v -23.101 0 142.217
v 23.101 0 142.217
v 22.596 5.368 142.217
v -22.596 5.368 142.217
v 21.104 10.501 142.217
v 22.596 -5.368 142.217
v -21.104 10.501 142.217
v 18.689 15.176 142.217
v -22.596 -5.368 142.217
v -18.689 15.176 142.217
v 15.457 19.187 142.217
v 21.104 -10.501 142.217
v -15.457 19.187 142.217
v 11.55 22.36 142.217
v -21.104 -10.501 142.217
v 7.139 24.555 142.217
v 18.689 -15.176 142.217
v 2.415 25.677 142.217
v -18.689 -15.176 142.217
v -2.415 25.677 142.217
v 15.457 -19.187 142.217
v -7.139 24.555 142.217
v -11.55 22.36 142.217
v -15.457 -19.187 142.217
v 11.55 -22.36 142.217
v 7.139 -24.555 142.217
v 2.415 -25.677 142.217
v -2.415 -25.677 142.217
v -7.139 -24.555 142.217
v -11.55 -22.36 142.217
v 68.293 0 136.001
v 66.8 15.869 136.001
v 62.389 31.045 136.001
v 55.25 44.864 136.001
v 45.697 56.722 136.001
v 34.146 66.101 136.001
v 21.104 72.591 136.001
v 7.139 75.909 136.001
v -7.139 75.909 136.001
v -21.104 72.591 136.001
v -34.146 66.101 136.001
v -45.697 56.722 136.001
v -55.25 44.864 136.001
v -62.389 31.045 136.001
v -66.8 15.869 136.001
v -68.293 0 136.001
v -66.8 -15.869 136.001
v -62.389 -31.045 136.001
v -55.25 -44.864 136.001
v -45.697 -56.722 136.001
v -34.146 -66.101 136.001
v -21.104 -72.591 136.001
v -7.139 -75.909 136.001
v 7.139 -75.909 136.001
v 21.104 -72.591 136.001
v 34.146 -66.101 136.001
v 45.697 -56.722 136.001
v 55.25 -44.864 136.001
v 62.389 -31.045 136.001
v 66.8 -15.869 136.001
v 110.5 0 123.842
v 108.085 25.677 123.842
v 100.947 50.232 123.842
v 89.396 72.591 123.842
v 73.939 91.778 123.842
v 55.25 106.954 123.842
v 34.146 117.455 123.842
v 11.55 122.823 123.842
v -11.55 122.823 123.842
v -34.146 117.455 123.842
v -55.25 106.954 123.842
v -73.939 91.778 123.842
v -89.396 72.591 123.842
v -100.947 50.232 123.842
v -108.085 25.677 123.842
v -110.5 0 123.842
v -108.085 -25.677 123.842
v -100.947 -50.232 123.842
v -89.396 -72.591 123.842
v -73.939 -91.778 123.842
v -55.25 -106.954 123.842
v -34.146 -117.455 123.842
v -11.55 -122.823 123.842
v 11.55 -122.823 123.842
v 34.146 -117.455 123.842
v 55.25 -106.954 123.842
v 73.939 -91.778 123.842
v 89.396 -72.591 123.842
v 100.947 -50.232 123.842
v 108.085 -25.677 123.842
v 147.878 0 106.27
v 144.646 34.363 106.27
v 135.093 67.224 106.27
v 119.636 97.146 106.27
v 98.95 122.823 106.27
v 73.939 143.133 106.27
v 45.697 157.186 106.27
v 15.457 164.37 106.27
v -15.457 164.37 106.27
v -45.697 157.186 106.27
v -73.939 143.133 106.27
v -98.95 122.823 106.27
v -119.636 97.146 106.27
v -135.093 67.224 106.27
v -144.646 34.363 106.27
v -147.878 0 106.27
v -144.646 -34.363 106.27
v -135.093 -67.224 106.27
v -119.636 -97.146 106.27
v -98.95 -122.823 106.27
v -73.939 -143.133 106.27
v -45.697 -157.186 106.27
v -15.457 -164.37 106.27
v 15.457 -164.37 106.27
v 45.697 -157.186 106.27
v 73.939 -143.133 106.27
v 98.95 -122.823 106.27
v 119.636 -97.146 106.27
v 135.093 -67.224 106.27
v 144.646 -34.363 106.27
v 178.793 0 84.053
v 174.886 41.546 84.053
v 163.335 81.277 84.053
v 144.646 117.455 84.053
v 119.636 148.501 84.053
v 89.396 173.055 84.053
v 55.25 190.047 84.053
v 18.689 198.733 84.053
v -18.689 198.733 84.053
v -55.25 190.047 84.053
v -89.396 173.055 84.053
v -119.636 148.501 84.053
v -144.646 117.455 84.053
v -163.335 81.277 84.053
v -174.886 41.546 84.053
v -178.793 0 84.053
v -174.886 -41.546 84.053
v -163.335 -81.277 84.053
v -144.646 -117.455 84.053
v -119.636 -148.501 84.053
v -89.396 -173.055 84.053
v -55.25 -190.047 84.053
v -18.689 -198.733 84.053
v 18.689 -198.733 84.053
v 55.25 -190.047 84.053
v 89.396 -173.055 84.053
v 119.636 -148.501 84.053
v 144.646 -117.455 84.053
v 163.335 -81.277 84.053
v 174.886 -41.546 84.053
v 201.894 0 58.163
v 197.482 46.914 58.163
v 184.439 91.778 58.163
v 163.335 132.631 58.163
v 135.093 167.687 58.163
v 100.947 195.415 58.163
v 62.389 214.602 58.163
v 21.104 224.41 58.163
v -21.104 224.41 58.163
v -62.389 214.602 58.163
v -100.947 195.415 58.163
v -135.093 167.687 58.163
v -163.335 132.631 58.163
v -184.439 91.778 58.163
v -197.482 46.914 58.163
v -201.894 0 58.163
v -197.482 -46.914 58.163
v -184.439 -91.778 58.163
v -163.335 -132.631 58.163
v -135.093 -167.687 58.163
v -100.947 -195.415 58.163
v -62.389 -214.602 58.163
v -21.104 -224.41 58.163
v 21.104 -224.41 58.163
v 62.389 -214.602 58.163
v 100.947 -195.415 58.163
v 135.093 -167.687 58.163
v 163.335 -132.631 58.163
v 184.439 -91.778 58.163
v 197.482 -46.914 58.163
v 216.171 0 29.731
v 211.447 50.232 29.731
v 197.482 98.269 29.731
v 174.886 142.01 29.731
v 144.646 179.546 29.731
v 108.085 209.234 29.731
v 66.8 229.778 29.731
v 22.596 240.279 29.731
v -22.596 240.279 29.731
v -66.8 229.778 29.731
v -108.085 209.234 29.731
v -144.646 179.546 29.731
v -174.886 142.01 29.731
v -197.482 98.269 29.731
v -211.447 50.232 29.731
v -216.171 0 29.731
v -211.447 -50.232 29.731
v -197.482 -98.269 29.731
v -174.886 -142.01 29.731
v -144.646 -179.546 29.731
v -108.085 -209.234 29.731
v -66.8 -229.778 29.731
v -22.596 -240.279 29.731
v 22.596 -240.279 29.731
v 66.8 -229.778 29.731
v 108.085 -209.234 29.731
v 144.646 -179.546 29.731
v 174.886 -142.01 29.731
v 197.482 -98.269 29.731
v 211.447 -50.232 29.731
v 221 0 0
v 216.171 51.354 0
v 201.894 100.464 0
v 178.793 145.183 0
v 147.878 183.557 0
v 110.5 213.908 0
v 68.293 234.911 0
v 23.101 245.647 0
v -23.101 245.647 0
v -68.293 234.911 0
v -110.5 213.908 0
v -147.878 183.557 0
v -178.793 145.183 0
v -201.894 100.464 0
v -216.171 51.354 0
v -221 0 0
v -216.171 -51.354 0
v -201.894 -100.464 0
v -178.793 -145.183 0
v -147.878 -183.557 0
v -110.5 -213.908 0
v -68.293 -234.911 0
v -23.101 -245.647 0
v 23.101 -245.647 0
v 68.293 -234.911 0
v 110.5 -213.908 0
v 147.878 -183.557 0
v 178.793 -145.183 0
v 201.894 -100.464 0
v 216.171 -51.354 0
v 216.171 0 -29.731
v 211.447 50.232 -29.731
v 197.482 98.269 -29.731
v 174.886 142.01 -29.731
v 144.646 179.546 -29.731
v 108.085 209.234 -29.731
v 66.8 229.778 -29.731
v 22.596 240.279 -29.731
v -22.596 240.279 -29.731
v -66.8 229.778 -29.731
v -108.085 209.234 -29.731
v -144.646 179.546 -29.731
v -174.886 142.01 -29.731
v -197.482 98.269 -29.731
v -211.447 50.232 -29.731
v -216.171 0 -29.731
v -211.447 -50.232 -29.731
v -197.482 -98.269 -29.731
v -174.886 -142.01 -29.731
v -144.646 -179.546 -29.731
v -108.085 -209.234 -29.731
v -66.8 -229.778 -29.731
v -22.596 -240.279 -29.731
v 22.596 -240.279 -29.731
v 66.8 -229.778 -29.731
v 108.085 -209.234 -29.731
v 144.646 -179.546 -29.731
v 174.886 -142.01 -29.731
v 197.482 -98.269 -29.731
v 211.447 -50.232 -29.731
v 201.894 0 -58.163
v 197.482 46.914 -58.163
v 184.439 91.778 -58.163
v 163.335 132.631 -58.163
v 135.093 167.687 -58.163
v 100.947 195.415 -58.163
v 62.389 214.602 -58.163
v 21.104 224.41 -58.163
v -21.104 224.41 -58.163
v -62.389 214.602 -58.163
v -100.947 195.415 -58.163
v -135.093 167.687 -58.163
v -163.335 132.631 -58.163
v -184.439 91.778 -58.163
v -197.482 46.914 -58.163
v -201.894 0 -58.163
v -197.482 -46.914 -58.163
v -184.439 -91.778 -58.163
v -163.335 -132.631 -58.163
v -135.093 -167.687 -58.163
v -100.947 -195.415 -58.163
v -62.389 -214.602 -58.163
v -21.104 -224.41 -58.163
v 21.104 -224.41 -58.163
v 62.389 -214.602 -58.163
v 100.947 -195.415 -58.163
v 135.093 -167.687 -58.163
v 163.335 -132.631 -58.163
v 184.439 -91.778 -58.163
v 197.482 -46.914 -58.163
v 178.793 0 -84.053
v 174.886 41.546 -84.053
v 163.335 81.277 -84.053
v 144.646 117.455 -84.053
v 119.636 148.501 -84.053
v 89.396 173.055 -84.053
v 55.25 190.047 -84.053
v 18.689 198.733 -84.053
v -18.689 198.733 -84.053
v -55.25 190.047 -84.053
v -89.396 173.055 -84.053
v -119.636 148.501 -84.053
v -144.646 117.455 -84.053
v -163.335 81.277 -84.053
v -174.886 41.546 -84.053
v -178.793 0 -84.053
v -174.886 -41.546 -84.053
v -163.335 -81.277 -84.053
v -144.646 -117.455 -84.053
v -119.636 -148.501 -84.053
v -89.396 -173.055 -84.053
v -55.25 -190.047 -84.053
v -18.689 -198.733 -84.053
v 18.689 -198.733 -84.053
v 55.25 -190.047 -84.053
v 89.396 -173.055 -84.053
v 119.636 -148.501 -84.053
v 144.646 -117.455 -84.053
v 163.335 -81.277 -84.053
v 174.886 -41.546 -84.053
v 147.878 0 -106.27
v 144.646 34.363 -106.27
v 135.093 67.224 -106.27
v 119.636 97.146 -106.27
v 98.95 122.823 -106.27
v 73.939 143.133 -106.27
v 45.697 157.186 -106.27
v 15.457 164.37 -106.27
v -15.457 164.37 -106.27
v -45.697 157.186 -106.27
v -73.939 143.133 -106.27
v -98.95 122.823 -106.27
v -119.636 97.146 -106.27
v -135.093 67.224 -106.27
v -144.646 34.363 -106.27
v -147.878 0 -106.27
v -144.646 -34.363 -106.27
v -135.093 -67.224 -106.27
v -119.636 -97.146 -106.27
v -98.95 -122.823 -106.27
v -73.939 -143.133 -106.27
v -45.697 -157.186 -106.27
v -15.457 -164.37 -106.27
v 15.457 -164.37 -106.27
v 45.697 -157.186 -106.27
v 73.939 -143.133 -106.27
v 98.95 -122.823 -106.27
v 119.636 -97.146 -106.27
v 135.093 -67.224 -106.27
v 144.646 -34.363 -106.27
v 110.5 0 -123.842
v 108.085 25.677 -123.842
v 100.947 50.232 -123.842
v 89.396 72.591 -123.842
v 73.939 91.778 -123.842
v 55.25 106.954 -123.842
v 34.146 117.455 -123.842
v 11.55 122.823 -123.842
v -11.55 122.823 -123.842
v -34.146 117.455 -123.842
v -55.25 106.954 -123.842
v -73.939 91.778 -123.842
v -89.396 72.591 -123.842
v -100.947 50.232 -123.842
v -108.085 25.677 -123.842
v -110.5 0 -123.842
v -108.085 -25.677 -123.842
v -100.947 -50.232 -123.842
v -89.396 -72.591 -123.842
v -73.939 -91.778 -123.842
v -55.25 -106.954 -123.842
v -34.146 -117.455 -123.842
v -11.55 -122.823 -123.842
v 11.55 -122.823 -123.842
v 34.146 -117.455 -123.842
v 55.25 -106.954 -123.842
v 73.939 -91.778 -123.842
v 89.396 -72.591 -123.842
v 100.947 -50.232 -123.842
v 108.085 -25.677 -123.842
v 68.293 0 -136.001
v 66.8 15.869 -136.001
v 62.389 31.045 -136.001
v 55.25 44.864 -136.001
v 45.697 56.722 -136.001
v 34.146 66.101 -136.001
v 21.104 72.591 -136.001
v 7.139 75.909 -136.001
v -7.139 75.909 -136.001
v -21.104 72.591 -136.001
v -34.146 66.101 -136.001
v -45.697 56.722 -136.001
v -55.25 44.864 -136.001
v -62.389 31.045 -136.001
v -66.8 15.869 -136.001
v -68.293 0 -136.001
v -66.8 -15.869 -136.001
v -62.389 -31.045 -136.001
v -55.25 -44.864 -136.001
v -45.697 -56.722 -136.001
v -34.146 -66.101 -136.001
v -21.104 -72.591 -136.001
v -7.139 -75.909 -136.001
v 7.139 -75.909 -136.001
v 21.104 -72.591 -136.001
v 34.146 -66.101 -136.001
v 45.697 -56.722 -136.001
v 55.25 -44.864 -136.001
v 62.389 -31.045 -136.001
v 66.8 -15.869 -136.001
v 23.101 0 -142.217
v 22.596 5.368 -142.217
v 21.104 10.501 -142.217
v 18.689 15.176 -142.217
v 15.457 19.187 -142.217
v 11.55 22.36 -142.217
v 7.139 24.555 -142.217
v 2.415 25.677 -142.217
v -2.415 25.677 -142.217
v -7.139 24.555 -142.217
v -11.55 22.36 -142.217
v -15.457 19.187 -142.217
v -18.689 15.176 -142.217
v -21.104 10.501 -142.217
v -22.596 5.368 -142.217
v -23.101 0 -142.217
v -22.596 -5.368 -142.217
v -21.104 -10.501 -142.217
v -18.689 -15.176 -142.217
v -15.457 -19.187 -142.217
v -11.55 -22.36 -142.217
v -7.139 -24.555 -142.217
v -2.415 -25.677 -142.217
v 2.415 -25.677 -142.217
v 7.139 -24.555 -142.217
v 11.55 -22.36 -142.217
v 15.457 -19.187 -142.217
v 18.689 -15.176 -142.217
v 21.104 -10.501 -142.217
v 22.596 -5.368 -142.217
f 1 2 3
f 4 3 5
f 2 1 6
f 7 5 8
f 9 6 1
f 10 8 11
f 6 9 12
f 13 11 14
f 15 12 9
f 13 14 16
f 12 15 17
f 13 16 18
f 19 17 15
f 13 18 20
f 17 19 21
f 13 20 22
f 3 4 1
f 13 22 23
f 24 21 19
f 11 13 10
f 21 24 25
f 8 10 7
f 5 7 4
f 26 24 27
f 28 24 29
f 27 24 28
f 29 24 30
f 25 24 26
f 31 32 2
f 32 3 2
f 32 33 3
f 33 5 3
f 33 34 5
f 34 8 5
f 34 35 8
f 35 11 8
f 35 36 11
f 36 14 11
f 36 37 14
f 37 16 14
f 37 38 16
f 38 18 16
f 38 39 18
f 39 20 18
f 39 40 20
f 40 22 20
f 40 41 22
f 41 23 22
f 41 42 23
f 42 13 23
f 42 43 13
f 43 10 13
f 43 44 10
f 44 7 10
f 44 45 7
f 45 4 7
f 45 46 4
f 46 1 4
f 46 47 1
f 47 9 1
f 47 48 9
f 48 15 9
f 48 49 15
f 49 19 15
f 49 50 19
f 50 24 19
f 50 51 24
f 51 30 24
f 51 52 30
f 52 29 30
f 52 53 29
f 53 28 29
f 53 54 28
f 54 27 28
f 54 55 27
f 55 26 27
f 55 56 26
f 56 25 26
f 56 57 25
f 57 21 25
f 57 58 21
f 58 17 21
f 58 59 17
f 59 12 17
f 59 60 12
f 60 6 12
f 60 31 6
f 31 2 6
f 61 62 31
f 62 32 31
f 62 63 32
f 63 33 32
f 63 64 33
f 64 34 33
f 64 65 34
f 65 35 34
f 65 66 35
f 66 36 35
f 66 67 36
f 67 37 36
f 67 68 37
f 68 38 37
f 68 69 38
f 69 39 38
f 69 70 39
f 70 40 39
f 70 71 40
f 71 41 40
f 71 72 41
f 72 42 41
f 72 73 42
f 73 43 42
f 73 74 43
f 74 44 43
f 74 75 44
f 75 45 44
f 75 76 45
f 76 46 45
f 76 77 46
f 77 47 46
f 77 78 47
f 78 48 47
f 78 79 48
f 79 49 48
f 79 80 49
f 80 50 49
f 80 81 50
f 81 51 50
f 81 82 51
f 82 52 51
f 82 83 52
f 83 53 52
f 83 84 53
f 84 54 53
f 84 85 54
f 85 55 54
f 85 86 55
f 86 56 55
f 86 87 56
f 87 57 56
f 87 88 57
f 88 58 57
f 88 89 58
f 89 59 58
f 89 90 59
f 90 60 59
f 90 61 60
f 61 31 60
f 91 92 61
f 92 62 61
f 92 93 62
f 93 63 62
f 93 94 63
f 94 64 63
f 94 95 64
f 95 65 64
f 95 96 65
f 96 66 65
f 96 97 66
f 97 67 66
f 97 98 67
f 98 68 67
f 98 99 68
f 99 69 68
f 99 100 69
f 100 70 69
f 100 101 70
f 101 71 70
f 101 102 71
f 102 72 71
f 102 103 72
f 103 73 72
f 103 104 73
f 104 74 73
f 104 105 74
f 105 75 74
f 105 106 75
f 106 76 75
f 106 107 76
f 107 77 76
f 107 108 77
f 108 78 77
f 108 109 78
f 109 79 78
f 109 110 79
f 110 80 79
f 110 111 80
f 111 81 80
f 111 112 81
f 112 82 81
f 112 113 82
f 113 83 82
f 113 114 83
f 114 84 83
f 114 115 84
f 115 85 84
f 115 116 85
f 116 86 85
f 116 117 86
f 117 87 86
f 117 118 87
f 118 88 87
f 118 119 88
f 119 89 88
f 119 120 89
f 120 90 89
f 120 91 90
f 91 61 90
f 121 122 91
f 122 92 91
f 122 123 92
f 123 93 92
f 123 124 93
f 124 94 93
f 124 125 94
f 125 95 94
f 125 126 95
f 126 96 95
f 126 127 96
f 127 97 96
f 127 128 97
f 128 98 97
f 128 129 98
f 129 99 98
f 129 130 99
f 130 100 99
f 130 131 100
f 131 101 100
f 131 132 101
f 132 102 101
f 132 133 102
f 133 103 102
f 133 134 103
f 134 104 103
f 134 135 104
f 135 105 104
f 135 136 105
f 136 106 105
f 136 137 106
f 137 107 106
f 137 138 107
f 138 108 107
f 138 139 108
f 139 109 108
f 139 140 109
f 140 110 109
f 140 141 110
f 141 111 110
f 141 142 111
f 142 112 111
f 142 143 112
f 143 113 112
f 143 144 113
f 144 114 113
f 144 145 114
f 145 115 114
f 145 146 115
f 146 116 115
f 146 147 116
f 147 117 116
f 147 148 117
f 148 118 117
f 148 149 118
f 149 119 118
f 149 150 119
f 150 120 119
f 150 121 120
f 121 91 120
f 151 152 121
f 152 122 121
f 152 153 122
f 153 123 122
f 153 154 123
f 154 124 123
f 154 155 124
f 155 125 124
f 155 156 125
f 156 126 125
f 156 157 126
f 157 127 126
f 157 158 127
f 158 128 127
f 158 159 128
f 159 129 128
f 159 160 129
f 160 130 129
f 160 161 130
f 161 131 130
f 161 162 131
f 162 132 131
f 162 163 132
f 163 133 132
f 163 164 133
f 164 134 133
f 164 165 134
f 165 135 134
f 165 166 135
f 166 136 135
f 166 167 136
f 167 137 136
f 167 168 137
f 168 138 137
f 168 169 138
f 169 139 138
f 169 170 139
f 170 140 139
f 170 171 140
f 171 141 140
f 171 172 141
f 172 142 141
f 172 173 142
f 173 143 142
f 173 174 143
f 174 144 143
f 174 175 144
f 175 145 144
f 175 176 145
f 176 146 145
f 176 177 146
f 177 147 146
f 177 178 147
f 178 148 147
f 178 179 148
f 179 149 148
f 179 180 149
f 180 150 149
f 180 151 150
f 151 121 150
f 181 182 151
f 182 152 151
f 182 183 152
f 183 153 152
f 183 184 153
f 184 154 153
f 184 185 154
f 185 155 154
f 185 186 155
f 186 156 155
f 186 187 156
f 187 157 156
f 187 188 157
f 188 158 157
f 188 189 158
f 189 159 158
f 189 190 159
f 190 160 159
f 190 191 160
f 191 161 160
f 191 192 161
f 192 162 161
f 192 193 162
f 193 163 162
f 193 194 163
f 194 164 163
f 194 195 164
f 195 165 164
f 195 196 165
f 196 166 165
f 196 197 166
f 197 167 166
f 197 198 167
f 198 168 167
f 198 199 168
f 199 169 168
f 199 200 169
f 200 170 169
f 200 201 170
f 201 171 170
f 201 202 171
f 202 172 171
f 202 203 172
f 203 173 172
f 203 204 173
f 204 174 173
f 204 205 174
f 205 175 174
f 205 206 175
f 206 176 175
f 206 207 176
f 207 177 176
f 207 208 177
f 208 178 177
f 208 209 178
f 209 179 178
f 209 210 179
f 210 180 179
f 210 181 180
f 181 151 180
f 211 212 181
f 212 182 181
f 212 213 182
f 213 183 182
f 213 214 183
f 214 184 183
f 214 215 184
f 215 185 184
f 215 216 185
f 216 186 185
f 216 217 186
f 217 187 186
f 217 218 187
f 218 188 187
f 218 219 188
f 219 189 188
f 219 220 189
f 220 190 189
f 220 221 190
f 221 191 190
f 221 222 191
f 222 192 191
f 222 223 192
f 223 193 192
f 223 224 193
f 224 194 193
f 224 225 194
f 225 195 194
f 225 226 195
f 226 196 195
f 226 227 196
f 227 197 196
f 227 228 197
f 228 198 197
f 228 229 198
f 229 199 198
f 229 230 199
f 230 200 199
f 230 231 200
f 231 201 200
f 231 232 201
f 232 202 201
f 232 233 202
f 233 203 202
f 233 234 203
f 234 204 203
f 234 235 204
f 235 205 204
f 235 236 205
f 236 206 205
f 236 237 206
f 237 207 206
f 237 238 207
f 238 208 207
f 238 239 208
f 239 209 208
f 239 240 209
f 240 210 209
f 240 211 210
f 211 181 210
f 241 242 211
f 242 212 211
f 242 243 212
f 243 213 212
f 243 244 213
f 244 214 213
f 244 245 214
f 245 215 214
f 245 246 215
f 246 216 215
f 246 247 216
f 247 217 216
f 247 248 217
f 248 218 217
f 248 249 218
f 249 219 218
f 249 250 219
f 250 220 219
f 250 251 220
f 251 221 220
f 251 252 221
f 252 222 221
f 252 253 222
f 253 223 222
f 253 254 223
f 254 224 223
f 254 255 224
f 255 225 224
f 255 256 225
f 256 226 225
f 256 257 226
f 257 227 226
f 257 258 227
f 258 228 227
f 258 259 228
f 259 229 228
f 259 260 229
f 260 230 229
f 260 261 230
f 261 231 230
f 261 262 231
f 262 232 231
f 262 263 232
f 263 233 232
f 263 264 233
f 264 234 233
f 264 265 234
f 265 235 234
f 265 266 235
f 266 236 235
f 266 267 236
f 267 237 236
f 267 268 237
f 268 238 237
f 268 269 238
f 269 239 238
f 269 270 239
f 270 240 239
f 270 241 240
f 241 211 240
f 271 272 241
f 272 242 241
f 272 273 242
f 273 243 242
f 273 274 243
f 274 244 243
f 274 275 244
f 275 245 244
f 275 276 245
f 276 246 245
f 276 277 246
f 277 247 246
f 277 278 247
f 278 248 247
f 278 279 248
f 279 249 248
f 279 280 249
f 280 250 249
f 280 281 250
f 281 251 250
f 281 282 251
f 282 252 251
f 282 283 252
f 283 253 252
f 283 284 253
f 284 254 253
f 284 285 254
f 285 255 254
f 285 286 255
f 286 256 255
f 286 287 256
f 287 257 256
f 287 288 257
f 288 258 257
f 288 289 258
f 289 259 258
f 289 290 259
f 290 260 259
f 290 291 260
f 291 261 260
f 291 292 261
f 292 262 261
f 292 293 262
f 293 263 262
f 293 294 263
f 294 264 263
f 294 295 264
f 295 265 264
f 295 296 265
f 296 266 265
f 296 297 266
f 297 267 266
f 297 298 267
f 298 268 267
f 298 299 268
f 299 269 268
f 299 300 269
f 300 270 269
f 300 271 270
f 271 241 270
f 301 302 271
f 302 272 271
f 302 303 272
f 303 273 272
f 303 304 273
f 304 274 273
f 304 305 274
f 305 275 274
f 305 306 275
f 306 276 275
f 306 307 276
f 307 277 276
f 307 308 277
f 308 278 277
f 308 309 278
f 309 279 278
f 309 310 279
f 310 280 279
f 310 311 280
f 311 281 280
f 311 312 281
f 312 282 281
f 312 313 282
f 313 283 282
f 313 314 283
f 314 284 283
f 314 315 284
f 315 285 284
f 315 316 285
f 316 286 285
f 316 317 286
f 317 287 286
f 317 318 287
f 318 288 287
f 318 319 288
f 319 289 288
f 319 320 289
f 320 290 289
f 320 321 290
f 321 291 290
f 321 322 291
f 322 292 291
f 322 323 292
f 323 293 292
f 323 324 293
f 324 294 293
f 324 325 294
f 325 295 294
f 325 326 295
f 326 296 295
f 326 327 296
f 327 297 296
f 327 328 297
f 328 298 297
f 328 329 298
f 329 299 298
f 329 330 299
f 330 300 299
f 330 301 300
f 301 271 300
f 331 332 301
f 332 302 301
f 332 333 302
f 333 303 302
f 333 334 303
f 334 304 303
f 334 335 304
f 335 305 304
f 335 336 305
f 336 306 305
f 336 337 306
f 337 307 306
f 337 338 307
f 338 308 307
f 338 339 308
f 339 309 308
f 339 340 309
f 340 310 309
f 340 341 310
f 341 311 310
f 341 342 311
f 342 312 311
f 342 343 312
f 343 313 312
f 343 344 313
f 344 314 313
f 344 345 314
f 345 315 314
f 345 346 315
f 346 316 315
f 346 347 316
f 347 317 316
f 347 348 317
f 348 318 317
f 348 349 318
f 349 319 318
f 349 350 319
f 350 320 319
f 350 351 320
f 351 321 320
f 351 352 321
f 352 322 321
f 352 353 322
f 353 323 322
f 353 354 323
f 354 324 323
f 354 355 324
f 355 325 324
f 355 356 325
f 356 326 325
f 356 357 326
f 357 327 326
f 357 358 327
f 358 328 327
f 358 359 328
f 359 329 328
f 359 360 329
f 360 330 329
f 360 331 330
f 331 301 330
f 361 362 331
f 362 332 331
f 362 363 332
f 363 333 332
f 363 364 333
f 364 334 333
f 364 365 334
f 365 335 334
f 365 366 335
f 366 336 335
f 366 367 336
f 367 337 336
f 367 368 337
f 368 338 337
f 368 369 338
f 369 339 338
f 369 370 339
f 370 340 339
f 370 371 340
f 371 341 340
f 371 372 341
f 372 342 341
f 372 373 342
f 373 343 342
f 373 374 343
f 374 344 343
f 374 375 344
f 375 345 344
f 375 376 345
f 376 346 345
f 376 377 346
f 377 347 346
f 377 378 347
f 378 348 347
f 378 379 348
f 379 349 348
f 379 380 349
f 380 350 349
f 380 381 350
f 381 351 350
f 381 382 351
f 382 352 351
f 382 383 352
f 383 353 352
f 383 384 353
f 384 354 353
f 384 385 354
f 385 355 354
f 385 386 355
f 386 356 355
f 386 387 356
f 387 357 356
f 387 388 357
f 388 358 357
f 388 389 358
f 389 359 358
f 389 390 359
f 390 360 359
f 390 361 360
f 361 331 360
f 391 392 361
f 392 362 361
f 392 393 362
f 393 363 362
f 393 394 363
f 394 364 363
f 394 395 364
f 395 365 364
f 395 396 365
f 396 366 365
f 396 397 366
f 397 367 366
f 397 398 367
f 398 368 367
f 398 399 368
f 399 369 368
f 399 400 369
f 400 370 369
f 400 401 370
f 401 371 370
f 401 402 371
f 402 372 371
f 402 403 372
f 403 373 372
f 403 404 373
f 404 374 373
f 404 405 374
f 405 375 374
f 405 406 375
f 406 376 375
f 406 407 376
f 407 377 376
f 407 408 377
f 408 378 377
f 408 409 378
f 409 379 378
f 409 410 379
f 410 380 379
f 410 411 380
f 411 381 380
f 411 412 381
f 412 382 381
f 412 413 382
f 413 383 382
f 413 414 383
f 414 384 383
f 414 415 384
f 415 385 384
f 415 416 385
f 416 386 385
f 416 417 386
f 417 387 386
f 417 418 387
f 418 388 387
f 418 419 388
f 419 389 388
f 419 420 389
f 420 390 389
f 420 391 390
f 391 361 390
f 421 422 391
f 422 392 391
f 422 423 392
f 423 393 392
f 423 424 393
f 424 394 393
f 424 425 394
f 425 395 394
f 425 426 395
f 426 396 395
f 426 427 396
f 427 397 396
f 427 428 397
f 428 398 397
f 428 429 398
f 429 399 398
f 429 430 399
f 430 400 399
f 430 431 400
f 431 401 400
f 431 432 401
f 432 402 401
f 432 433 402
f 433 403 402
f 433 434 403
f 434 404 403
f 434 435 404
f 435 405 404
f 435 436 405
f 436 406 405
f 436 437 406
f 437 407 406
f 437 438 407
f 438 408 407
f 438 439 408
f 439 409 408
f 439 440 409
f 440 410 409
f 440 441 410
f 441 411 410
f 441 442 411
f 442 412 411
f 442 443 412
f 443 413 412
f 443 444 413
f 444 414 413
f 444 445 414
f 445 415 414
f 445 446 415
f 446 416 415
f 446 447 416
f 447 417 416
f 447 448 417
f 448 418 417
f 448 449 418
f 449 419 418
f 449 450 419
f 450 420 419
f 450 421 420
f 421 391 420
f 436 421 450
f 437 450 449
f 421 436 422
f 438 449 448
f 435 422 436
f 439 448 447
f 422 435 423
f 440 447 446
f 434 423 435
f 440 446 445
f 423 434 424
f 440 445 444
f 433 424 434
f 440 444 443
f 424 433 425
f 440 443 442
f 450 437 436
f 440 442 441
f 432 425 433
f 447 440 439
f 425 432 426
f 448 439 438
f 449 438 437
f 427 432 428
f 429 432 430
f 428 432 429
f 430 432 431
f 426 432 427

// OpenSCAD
// Generated by SolidPython 1.0.1 on 2020-07-29 00:46:53


scale(v = [17, 19, 11]) {
	sphere(r = 13);
}
/***********************************************
*********      SolidPython code:      **********
************************************************
 
# import packages: SolidPython
from solid import *
from solid.utils import *
from itertools import chain, combinations, permutations


class Resize:

    def __init__(self, scad_file):
        self.scad_file = scad_file
        #self.scad_file = import_scad(scad_file)
        # cone/cylinder param:
        self.r1 = 0
        self.r2 = 0
        self.h = 0
        # rectangular prism param:
        self.w = 0
        self.l = 0
        # ellipse param:
        self.r = 0

    # import OpenScad code (file name corresponds to shape)


    # classify shape + parameters
    def assign(self, param1, param2, param3):
        if self.scad_file == 'cone.scad':
            self.r1 = param1
            self.r2 = param2
            self.h = param3
        elif self.scad_file == 'cylinder.scad':
            self.r1 = param1
            self.r2 = param2
            self.h = param3
        elif self.scad_file == 'rectangularPrism.scad':
            self.h = param1
            self.l = param2
            self.w = param3
        else:
            self.r = param1
            self.h = param2

    # resize parameters
    def iterate(self):
        x = range(3, 20, 2)
        i = 1
        if self.scad_file == 'cone.scad':
            tempList = list(permutations(x, 2))
            for temp in tempList:
                param1 = temp[0]
                param2 = temp[1]
                filepath = 'produced_scad_files/' + 'cone' + str(param1) + '_' + str(param2) + '_' + '.scad'
                scad_render_to_file(cylinder(h=param1, r1=param2, r2=0), filepath)

        elif self.scad_file == 'cylinder.scad':
            tempList = list(permutations(x, 3))
            for temp in tempList:
                param1 = temp[0]
                param2 = temp[1]
                filepath = 'produced_scad_files/' + 'cylinder' + str(param1) + '_' + str(param2) + '_' + '.scad'
                scad_render_to_file(cylinder(h=param1, r1=param2, r2=param2), filepath)

        elif self.scad_file == 'rectangularPrism.scad':
            tempList = list(permutations(x, 3))
            for temp in tempList:
                param1 = temp[0]
                param2 = temp[1]
                param3 = temp[2]
                filepath = 'produced_scad_files/' + 'rectangularPrism' + str(param1) + '_' + str(param2) + '_' + str(
                    param3) + '.scad'
                scad_render_to_file(cube(size=(param1, param2, param3)), filepath)

        elif self.scad_file == 'ellipse.scad':
            tempList = list(permutations(x, 4))
            for temp in tempList:
                param1 = temp[0]
                param2 = temp[1]
                param3 = temp[2]
                param4 = temp[3]
                filepath = 'produced_scad_files/' + 'ellipse' + str(param1) + '_' + str(param2) + '_' + str(param3) + '_' + str(param4) + '.scad'
                scad_render_to_file(scale([param1, param2, param3])(sphere(r=param4)), filepath)

    def render_to_scadfile(self):
        scad_render_to_file(scad, 'example.scad') 
 
************************************************/
